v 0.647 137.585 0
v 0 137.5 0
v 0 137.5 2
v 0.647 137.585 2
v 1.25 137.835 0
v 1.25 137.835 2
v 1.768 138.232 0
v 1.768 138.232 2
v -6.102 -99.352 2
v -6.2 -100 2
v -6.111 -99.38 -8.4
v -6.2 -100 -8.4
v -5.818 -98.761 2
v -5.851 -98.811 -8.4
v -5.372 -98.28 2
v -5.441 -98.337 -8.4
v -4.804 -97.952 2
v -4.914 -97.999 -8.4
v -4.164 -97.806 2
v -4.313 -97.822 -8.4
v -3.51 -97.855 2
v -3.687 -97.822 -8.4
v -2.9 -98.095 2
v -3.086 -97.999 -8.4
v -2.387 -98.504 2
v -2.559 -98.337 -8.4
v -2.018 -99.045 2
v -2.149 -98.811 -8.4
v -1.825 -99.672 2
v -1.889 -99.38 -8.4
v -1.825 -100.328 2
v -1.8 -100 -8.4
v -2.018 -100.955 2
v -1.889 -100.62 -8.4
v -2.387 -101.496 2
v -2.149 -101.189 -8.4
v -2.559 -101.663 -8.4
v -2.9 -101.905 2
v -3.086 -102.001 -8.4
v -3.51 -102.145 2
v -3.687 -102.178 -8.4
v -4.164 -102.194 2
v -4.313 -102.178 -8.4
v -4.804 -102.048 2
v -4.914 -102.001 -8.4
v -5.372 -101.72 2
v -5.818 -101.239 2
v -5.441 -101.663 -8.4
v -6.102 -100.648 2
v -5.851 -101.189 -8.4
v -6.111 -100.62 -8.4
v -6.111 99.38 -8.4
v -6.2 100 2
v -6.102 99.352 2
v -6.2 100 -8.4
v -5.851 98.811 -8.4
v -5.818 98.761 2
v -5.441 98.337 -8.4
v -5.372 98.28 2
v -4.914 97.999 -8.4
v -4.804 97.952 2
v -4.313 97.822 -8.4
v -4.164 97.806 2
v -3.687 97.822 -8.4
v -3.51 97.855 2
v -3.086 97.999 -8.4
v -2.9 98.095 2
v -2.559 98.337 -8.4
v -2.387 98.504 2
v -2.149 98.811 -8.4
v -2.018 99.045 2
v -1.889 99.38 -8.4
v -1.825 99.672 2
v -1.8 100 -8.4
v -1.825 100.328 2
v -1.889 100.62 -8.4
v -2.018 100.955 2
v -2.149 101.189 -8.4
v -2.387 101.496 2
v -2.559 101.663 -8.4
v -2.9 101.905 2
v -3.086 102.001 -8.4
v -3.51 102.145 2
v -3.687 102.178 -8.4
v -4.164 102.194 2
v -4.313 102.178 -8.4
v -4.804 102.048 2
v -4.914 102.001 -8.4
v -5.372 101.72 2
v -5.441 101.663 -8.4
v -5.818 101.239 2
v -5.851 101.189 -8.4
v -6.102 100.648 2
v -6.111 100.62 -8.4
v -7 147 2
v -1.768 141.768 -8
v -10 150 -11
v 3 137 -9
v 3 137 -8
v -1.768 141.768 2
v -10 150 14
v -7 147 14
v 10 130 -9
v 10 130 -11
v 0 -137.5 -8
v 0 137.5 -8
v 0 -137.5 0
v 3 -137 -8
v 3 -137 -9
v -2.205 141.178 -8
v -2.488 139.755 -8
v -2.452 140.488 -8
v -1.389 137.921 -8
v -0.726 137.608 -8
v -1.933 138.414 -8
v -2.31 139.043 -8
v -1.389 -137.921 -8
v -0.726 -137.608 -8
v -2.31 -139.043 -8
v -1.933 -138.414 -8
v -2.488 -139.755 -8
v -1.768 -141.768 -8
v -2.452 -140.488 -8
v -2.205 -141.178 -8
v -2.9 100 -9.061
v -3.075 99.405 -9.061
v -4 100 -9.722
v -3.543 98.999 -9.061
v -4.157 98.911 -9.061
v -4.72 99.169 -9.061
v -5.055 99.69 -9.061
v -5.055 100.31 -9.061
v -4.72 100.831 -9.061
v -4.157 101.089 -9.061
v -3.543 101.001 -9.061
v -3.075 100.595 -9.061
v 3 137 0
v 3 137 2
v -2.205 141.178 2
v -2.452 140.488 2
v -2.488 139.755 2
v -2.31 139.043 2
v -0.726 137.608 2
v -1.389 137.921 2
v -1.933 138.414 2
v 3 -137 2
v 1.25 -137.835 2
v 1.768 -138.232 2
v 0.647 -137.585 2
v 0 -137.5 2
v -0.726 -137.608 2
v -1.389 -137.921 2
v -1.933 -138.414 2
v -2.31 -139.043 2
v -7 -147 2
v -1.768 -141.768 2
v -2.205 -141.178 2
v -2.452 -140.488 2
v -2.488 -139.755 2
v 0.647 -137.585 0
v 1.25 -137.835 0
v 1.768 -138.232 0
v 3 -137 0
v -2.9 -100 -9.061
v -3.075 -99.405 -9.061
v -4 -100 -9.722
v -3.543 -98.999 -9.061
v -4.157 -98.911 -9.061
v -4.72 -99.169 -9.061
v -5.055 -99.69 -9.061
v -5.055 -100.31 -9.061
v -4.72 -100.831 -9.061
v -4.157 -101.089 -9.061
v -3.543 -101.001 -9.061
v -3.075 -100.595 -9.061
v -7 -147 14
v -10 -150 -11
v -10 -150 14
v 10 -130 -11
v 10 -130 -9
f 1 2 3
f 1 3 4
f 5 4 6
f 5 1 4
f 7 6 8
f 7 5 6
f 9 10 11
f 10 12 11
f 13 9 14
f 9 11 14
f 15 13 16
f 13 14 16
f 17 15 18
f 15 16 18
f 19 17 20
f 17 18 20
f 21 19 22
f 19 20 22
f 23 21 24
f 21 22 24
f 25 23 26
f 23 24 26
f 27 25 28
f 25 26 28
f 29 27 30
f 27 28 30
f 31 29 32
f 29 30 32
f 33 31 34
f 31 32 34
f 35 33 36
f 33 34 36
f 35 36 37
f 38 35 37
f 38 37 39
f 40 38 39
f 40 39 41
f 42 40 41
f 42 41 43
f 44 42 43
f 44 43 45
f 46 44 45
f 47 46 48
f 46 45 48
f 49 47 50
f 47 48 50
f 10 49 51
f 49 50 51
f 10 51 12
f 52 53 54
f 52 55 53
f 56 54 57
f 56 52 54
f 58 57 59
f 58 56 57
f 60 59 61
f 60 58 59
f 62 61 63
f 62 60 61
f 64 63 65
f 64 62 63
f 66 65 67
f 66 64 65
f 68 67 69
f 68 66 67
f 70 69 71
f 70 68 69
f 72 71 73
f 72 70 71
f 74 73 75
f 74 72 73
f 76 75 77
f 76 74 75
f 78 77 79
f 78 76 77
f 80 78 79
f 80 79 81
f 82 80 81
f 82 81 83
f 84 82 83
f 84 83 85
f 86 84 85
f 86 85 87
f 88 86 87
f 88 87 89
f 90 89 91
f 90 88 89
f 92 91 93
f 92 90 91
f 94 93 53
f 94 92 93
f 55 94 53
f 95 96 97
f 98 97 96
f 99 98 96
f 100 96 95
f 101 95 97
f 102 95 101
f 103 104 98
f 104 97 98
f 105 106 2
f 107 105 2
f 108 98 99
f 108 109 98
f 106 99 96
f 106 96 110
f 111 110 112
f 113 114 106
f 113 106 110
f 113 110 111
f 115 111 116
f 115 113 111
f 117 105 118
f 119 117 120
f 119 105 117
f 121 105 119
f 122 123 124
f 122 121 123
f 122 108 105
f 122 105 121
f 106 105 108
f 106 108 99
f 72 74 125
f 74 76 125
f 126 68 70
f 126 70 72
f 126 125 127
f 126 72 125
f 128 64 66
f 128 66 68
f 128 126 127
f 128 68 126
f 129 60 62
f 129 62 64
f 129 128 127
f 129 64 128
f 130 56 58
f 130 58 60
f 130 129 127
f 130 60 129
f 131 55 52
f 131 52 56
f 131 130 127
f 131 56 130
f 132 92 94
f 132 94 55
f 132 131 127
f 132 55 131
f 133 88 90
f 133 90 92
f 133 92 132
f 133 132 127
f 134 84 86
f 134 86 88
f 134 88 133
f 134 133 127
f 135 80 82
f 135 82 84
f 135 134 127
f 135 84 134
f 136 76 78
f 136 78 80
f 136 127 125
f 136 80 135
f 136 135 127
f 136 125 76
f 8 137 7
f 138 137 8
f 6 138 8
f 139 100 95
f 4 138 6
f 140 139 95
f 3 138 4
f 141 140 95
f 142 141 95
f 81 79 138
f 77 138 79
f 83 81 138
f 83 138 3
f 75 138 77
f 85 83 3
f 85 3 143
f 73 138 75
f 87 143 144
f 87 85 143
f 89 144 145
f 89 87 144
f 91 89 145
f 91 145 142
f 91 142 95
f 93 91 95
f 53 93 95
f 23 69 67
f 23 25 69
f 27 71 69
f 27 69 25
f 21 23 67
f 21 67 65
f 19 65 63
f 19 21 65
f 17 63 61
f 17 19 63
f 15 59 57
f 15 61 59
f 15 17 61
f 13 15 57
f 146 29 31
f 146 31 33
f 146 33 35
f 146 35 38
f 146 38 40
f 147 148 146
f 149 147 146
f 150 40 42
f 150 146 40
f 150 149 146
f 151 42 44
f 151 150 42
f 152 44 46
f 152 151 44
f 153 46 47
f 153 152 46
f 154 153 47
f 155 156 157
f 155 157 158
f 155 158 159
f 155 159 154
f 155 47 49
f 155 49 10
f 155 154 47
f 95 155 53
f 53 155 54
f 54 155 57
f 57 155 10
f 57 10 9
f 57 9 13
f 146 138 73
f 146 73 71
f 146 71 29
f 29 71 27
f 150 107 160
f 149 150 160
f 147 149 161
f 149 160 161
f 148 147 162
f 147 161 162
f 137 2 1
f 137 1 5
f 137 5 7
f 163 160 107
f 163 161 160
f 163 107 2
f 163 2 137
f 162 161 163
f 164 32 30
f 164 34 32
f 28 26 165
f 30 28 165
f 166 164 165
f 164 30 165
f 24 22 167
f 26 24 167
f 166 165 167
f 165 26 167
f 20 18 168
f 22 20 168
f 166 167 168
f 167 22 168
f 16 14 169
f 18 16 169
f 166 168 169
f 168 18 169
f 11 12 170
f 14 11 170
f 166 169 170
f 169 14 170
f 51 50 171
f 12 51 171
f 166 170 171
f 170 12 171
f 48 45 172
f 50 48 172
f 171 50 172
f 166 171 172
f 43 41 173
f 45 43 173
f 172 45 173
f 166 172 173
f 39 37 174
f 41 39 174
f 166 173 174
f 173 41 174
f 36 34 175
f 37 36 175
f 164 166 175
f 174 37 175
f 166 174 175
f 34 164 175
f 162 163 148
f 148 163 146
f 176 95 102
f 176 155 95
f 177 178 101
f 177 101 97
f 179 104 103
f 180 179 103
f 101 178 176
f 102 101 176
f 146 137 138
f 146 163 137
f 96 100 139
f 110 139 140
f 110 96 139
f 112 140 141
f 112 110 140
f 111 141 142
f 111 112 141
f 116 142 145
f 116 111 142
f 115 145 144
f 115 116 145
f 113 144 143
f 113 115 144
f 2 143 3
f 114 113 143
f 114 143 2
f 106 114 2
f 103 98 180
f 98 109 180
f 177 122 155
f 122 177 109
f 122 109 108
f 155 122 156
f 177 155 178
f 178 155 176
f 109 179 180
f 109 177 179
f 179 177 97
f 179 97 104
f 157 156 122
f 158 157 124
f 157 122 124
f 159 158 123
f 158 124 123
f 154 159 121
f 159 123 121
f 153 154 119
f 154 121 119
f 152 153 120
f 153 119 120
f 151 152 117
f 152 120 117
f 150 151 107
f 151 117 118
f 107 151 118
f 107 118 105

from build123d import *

# Parameters (mm, degrees)
F0_W     = 3
F0_H     = 12
F0_W_2   = 7
F0_H_2   = 1
F1_DEPTH = 150
F3_D     = 4.4
F3_DEPTH = 10.4
F3_TIP   = 1.3218933619
F4_SIZE  = 19.99999
F6_DEPTH = 8


# Not quite as in the source:
# - a fillet or chamfer is up to 0.001 mm smaller than in the source, because OpenCascade refuses the exact size


with BuildPart() as f1:
    # F0 (on Front) → F1 (new body)
    with BuildSketch(Plane.XZ):
        with Locations((-8.5, 8)):
            Rectangle(F0_W, F0_H)
        Polygon((-10, 0), (0, 0), (3, 0), (3, 2), (-7, 2), (-10, 2), align=None)
        Polygon((0, -8), (0, 0), (-10, 0), (-10, -10), (0, -10), align=None)
        Polygon((0, -10), (-10, -10), (-10, -11), (10, -11), (10, -10), (3, -10), align=None)
        with Locations((6.5, -9.5)):
            Rectangle(F0_W_2, F0_H_2)
        Polygon((3, -8), (0, -8), (0, -10), (3, -10), (3, -9), align=None)
    extrude(amount=F1_DEPTH)

    # F3
    with Locations(Plane.XY.offset(2)):
        with Locations((-4, -100)):
            Hole(F3_D / 2, depth=F3_DEPTH)
            with Locations((0, 0, -(F3_DEPTH + F3_TIP / 2))):  # 118° drill point
                Cone(0, F3_D / 2, F3_TIP, mode=Mode.SUBTRACT)

    # F4 (size 20 in the source; OpenCascade refuses exactly that, so slightly less here)
    f4_edges = [f1.edges().sort_by_distance(p)[0] for p in [
        (10, -150, -10),
    ]]
    chamfer(f4_edges, length=F4_SIZE)

    # F5 (on face) → F6 (cut, symmetric)
    with BuildSketch(Plane(origin=(0, 0, 0), x_dir=(1, 0, 0), z_dir=(0, 0, -1))):
        with BuildLine():
            ThreePointArc((1.767771953, 138.232238047), (2.3097001843, 139.0432946855), (2.5, 140))
            ThreePointArc((2.5, 140), (-1.767766953, 141.767766953), (0, 137.5))
            Line((0, 137.5), (0, 140.00001))
            Line((0, 140.00001), (1.767771953, 138.232238047))
        make_face()
        with BuildLine():
            Line((0, 140.00001), (0, 137.5))
            ThreePointArc((0, 137.5), (0.9567118473, 137.6903025217), (1.767771953, 138.232238047))
            Line((1.767771953, 138.232238047), (0, 140.00001))
        make_face()
    extrude(amount=F6_DEPTH, both=True, mode=Mode.SUBTRACT)

    # F7: F1 across face


with BuildPart() as f1_1:
    add(f1.part)
    add(f1.part.mirror(Plane(origin=(-4.3205128205, 0, -2.6487179487), x_dir=(1, 0, 0), z_dir=(0, 1, 0))))


solid = f1_1.part
